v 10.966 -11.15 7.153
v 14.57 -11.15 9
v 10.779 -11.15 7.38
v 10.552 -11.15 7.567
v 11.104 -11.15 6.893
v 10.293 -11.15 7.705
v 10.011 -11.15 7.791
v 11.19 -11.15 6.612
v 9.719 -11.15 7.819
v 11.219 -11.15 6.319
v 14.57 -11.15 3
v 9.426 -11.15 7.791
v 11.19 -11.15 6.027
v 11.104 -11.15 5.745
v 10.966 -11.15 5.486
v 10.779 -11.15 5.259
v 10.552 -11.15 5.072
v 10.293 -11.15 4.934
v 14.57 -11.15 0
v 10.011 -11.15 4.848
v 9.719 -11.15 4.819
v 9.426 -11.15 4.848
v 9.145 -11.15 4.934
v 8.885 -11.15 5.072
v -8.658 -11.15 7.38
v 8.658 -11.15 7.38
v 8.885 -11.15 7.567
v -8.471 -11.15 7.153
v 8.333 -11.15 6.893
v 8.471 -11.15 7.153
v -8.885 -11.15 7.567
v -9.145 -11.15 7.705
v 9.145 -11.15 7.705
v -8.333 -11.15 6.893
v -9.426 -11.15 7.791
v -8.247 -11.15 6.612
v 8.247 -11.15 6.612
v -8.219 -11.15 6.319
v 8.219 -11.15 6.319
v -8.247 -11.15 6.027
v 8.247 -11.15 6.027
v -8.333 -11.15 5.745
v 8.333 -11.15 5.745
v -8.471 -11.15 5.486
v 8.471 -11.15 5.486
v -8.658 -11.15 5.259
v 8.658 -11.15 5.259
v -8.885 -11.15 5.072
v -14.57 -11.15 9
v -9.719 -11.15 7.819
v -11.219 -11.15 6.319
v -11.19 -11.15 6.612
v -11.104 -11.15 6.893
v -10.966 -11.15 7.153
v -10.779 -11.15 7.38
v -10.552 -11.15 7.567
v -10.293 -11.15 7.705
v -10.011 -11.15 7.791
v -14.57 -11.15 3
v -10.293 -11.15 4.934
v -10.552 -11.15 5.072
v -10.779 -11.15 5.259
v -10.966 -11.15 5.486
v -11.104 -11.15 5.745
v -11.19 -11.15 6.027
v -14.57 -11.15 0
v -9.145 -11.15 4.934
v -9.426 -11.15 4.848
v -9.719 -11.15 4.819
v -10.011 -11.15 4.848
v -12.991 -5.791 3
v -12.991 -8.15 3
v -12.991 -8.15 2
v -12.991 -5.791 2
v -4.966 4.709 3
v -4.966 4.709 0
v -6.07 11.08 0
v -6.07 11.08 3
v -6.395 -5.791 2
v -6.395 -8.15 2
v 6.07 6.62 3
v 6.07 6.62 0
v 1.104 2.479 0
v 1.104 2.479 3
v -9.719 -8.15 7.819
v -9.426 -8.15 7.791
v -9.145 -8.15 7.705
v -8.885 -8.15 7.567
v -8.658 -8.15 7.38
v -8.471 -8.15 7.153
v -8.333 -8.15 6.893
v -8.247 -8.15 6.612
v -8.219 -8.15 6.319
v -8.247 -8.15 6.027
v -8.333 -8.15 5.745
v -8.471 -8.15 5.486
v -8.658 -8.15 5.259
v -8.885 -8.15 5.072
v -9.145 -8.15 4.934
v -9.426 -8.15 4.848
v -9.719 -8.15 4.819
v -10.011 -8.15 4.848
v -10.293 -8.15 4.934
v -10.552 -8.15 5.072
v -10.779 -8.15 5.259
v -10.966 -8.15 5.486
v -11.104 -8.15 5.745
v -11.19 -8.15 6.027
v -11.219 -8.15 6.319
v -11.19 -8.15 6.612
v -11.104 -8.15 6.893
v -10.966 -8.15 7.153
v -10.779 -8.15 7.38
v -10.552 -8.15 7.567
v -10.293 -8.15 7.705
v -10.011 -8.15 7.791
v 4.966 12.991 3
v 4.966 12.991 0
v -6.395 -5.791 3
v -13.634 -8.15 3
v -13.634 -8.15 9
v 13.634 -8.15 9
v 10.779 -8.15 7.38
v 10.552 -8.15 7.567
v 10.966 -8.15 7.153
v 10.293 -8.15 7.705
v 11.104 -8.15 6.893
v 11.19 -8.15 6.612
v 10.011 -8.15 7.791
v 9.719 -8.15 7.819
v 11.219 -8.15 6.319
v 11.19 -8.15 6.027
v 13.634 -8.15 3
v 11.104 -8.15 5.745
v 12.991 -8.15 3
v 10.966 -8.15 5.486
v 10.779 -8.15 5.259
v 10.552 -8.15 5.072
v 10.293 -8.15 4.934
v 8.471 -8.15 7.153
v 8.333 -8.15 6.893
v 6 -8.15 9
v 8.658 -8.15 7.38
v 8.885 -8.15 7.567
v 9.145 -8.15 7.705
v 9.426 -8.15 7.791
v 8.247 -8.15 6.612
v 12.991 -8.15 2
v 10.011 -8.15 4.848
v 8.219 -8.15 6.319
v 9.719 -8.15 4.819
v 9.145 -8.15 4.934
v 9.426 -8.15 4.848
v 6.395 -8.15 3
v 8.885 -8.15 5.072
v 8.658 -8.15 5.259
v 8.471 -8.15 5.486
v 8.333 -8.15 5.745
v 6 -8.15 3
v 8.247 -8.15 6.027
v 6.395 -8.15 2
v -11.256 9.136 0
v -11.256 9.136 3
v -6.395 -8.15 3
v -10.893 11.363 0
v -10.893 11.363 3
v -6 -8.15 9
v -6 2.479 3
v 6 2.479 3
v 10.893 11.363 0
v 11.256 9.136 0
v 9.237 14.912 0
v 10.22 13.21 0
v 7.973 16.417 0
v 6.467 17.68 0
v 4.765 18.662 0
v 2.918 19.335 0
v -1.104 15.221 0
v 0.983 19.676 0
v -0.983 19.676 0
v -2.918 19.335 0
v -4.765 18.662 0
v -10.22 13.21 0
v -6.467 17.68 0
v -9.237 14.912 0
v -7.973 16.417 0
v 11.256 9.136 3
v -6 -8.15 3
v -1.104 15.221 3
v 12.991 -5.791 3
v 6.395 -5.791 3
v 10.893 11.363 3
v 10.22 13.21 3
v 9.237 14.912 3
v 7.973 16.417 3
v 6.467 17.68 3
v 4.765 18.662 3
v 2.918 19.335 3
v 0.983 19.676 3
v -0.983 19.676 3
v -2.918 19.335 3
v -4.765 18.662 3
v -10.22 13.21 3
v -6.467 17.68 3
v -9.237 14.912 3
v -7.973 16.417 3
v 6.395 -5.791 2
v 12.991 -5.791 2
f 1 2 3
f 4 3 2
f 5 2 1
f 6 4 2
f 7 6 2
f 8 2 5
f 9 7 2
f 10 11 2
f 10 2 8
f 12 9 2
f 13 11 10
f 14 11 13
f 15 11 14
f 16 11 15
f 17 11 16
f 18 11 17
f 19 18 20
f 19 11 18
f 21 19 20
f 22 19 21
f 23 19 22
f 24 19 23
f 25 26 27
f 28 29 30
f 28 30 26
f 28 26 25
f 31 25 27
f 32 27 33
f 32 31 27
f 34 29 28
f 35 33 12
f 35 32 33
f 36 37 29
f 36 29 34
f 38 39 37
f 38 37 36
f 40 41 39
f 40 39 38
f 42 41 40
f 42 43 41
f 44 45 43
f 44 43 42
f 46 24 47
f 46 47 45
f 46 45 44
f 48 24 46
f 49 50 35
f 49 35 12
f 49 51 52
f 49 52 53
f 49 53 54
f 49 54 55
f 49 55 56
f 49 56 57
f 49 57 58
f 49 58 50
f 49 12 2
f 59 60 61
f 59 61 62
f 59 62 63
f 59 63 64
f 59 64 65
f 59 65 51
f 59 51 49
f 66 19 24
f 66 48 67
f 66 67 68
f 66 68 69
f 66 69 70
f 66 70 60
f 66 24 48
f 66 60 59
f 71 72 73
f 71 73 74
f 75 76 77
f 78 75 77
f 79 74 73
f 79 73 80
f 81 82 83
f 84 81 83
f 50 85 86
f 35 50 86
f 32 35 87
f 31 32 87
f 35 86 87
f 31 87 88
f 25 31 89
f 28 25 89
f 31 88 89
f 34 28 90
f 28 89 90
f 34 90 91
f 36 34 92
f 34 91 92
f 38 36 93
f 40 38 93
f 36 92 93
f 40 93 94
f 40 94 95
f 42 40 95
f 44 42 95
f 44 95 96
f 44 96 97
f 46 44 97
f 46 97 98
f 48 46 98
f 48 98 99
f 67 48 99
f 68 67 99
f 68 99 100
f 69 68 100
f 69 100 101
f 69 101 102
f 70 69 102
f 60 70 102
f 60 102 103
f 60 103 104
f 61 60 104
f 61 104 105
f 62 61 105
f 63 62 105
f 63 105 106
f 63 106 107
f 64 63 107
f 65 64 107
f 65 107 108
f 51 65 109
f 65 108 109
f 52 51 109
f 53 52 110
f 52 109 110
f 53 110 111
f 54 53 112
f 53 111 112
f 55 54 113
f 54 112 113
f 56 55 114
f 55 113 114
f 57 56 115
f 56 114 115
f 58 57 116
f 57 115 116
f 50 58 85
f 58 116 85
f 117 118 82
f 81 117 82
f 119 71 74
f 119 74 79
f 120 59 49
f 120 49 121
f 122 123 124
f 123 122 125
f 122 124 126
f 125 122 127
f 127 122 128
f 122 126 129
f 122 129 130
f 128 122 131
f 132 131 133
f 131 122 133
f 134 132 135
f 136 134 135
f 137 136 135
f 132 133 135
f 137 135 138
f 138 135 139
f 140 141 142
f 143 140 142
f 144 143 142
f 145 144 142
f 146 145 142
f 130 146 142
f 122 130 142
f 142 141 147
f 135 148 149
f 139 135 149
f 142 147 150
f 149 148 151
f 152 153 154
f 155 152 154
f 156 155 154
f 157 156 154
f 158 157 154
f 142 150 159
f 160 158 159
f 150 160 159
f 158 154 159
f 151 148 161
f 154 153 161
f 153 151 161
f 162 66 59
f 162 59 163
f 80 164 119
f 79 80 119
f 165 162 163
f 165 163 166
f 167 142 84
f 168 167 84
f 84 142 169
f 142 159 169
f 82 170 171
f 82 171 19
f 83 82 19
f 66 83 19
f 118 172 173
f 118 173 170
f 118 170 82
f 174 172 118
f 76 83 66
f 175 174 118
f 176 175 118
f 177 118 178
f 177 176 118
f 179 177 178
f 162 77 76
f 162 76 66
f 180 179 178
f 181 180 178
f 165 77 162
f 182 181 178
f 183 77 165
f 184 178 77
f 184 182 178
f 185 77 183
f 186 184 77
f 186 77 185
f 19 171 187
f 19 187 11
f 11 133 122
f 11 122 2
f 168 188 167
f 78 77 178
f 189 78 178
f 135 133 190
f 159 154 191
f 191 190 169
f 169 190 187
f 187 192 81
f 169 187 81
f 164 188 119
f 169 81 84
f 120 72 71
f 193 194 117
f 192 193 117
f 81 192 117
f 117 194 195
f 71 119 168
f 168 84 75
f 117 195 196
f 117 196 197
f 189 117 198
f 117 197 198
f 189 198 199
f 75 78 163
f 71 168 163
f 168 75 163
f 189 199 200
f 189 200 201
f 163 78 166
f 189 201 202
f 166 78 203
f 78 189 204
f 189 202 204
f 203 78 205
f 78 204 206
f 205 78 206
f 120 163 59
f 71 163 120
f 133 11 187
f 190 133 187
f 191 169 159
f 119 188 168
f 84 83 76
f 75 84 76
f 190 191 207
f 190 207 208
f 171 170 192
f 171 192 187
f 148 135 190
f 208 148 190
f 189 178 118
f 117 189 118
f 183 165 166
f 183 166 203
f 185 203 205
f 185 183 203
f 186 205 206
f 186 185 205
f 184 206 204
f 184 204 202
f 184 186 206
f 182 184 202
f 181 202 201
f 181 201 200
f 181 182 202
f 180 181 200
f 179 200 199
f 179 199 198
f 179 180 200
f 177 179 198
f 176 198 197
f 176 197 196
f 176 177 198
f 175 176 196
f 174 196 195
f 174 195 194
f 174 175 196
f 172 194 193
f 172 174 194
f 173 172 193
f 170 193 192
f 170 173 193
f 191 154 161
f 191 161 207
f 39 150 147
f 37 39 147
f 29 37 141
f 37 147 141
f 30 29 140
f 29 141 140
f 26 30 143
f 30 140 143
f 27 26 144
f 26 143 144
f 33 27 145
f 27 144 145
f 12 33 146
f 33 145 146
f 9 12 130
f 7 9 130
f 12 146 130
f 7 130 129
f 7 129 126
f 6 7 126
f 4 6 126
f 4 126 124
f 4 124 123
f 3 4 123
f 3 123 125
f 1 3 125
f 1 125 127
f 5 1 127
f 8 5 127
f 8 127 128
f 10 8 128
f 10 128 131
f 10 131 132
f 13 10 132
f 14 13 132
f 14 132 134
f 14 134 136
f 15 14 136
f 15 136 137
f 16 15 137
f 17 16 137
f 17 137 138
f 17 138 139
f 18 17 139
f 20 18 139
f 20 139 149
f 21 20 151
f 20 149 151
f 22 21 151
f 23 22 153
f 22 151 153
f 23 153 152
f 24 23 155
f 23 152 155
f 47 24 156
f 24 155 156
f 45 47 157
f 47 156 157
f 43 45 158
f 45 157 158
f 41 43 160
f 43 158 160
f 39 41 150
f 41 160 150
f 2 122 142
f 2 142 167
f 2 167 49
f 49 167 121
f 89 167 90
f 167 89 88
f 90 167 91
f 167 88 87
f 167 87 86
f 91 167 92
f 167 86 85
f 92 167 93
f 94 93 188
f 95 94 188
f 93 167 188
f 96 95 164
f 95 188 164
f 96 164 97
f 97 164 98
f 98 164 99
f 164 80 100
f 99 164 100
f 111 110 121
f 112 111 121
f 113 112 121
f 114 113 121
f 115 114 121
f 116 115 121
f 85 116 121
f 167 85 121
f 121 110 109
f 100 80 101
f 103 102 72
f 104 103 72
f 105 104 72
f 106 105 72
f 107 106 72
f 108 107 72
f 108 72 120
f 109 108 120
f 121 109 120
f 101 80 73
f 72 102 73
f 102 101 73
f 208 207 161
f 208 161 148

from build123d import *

# Parameters (mm, degrees)
SKETCH_1_R          = 6.5
EXTRUDE_1_DEPTH     = 3
EXTRUDE_2_DEPTH     = 6
SKETCH_5_R          = 1.5
CUT_EXTRUDE_1_DEPTH = 6
EXTRUDE_3_DEPTH     = 3
SKETCH_7_R          = 7.581975651
EXTRUDE_4_DEPTH     = 3
CUT_EXTRUDE_2_DEPTH = 3
EXTRUDE_5_DEPTH     = 6
SKETCH_10_W         = 6.596302857
SKETCH_10_H         = 2.358868677
CUT_EXTRUDE_3_DEPTH = 1


with BuildPart() as part:
    # 草图1 → 凸台-拉伸1 (new body)
    with BuildSketch(Plane.XY):
        with BuildLine():
            Line((0, -11.15), (-14.569688113, -11.15))
            Line((-14.569688113, -11.15), (-10.110162273, 3.152379613))
            ThreePointArc((-10.110162273, 3.152379613), (0, 10.590225607), (10.110162273, 3.152379613))
            Line((10.110162273, 3.152379613), (14.569688113, -11.15))
            Line((14.569688113, -11.15), (0, -11.15))
        make_face()
        Circle(SKETCH_1_R, mode=Mode.SUBTRACT)
    extrude(amount=EXTRUDE_1_DEPTH)

    # 草图4 → 凸台-拉伸2 (add)
    with BuildSketch(Plane.XY.offset(3)):
        Polygon((0, -8.15), (13.63427891, -8.15), (14.569688113, -11.15), (-14.569688113, -11.15), (-13.63427891, -8.15), align=None)
    extrude(amount=EXTRUDE_2_DEPTH)

    # 草图5 → 切除-拉伸1 (cut)
    with BuildSketch(Plane(origin=(0, -8.15, 0), x_dir=(1, 0, 0), z_dir=(0, 1, 0))):
        with Locations(Location((-9.718639025, -6.319329225, 0), (0, 0, 270))):
            Circle(SKETCH_5_R)
        with Locations(Location((9.718639025, -6.319329225, 0), (0, 0, 180))):
            Circle(SKETCH_5_R)
    extrude(amount=-CUT_EXTRUDE_1_DEPTH, mode=Mode.SUBTRACT)

    # 草图6 → 凸台-拉伸3 (add)
    with BuildSketch(Plane(origin=(0, 0, 0), x_dir=(-1, 0, 0), z_dir=(0, 0, -1))):
        with BuildLine():
            Line((10.110162273, 3.152379613), (14.569688113, -11.15))
            Line((14.569688113, -11.15), (11.256321717, 9.136259589))
            Line((11.256321717, 9.136259589), (10.892618435, 11.363052016))
            ThreePointArc((10.892618435, 11.363052016), (0, 19.718638154), (-10.892618435, 11.363052016))
            Line((-10.892618435, 11.363052016), (-11.256321717, 9.136259589))
            Line((-11.256321717, 9.136259589), (-14.569688113, -11.15))
            Line((-14.569688113, -11.15), (-10.110162273, 3.152379613))
            ThreePointArc((-10.110162273, 3.152379613), (0, 10.590225607), (10.110162273, 3.152379613))
        make_face()
    extrude(amount=-EXTRUDE_3_DEPTH)

    # 草图7 → 凸台-拉伸4 (add)
    with BuildSketch(Plane(origin=(0, 0, 0), x_dir=(-1, 0, 0), z_dir=(0, 0, -1))):
        Circle(SKETCH_7_R)
    extrude(amount=-EXTRUDE_4_DEPTH)

    # 草图8 → 切除-拉伸2 (cut)
    with BuildSketch(Plane(origin=(0, 0, 0), x_dir=(-1, 0, 0), z_dir=(0, 0, -1))):
        Polygon((1.103523442, 15.221465243), (-4.966089039, 12.991411956), (-6.069612481, 6.619946712), (-1.103523442, 2.478534757), (4.966089039, 4.708588044), (6.069612481, 11.080053288), align=None)
    extrude(amount=-CUT_EXTRUDE_2_DEPTH, mode=Mode.SUBTRACT)

    # 草图9 → 凸台-拉伸5 (add, symmetric)
    with BuildSketch(Plane(origin=(0, 0, 0), x_dir=(0, 0, -1), z_dir=(1, 0, 0))):
        Polygon((-9, -8.15), (-3, 2.478534757), (-3, -8.15), align=None)
    extrude(amount=EXTRUDE_5_DEPTH, both=True)

    # 草图10 → 切除-拉伸3 (cut)
    with BuildSketch(Plane.XY.offset(3)):
        with Locations((-9.693347491, -6.970565662)):
            Rectangle(SKETCH_10_W, SKETCH_10_H)
        with Locations((9.693347491, -6.970565662)):
            Rectangle(SKETCH_10_W, SKETCH_10_H)
    extrude(amount=-CUT_EXTRUDE_3_DEPTH, mode=Mode.SUBTRACT)


solid = part.part
